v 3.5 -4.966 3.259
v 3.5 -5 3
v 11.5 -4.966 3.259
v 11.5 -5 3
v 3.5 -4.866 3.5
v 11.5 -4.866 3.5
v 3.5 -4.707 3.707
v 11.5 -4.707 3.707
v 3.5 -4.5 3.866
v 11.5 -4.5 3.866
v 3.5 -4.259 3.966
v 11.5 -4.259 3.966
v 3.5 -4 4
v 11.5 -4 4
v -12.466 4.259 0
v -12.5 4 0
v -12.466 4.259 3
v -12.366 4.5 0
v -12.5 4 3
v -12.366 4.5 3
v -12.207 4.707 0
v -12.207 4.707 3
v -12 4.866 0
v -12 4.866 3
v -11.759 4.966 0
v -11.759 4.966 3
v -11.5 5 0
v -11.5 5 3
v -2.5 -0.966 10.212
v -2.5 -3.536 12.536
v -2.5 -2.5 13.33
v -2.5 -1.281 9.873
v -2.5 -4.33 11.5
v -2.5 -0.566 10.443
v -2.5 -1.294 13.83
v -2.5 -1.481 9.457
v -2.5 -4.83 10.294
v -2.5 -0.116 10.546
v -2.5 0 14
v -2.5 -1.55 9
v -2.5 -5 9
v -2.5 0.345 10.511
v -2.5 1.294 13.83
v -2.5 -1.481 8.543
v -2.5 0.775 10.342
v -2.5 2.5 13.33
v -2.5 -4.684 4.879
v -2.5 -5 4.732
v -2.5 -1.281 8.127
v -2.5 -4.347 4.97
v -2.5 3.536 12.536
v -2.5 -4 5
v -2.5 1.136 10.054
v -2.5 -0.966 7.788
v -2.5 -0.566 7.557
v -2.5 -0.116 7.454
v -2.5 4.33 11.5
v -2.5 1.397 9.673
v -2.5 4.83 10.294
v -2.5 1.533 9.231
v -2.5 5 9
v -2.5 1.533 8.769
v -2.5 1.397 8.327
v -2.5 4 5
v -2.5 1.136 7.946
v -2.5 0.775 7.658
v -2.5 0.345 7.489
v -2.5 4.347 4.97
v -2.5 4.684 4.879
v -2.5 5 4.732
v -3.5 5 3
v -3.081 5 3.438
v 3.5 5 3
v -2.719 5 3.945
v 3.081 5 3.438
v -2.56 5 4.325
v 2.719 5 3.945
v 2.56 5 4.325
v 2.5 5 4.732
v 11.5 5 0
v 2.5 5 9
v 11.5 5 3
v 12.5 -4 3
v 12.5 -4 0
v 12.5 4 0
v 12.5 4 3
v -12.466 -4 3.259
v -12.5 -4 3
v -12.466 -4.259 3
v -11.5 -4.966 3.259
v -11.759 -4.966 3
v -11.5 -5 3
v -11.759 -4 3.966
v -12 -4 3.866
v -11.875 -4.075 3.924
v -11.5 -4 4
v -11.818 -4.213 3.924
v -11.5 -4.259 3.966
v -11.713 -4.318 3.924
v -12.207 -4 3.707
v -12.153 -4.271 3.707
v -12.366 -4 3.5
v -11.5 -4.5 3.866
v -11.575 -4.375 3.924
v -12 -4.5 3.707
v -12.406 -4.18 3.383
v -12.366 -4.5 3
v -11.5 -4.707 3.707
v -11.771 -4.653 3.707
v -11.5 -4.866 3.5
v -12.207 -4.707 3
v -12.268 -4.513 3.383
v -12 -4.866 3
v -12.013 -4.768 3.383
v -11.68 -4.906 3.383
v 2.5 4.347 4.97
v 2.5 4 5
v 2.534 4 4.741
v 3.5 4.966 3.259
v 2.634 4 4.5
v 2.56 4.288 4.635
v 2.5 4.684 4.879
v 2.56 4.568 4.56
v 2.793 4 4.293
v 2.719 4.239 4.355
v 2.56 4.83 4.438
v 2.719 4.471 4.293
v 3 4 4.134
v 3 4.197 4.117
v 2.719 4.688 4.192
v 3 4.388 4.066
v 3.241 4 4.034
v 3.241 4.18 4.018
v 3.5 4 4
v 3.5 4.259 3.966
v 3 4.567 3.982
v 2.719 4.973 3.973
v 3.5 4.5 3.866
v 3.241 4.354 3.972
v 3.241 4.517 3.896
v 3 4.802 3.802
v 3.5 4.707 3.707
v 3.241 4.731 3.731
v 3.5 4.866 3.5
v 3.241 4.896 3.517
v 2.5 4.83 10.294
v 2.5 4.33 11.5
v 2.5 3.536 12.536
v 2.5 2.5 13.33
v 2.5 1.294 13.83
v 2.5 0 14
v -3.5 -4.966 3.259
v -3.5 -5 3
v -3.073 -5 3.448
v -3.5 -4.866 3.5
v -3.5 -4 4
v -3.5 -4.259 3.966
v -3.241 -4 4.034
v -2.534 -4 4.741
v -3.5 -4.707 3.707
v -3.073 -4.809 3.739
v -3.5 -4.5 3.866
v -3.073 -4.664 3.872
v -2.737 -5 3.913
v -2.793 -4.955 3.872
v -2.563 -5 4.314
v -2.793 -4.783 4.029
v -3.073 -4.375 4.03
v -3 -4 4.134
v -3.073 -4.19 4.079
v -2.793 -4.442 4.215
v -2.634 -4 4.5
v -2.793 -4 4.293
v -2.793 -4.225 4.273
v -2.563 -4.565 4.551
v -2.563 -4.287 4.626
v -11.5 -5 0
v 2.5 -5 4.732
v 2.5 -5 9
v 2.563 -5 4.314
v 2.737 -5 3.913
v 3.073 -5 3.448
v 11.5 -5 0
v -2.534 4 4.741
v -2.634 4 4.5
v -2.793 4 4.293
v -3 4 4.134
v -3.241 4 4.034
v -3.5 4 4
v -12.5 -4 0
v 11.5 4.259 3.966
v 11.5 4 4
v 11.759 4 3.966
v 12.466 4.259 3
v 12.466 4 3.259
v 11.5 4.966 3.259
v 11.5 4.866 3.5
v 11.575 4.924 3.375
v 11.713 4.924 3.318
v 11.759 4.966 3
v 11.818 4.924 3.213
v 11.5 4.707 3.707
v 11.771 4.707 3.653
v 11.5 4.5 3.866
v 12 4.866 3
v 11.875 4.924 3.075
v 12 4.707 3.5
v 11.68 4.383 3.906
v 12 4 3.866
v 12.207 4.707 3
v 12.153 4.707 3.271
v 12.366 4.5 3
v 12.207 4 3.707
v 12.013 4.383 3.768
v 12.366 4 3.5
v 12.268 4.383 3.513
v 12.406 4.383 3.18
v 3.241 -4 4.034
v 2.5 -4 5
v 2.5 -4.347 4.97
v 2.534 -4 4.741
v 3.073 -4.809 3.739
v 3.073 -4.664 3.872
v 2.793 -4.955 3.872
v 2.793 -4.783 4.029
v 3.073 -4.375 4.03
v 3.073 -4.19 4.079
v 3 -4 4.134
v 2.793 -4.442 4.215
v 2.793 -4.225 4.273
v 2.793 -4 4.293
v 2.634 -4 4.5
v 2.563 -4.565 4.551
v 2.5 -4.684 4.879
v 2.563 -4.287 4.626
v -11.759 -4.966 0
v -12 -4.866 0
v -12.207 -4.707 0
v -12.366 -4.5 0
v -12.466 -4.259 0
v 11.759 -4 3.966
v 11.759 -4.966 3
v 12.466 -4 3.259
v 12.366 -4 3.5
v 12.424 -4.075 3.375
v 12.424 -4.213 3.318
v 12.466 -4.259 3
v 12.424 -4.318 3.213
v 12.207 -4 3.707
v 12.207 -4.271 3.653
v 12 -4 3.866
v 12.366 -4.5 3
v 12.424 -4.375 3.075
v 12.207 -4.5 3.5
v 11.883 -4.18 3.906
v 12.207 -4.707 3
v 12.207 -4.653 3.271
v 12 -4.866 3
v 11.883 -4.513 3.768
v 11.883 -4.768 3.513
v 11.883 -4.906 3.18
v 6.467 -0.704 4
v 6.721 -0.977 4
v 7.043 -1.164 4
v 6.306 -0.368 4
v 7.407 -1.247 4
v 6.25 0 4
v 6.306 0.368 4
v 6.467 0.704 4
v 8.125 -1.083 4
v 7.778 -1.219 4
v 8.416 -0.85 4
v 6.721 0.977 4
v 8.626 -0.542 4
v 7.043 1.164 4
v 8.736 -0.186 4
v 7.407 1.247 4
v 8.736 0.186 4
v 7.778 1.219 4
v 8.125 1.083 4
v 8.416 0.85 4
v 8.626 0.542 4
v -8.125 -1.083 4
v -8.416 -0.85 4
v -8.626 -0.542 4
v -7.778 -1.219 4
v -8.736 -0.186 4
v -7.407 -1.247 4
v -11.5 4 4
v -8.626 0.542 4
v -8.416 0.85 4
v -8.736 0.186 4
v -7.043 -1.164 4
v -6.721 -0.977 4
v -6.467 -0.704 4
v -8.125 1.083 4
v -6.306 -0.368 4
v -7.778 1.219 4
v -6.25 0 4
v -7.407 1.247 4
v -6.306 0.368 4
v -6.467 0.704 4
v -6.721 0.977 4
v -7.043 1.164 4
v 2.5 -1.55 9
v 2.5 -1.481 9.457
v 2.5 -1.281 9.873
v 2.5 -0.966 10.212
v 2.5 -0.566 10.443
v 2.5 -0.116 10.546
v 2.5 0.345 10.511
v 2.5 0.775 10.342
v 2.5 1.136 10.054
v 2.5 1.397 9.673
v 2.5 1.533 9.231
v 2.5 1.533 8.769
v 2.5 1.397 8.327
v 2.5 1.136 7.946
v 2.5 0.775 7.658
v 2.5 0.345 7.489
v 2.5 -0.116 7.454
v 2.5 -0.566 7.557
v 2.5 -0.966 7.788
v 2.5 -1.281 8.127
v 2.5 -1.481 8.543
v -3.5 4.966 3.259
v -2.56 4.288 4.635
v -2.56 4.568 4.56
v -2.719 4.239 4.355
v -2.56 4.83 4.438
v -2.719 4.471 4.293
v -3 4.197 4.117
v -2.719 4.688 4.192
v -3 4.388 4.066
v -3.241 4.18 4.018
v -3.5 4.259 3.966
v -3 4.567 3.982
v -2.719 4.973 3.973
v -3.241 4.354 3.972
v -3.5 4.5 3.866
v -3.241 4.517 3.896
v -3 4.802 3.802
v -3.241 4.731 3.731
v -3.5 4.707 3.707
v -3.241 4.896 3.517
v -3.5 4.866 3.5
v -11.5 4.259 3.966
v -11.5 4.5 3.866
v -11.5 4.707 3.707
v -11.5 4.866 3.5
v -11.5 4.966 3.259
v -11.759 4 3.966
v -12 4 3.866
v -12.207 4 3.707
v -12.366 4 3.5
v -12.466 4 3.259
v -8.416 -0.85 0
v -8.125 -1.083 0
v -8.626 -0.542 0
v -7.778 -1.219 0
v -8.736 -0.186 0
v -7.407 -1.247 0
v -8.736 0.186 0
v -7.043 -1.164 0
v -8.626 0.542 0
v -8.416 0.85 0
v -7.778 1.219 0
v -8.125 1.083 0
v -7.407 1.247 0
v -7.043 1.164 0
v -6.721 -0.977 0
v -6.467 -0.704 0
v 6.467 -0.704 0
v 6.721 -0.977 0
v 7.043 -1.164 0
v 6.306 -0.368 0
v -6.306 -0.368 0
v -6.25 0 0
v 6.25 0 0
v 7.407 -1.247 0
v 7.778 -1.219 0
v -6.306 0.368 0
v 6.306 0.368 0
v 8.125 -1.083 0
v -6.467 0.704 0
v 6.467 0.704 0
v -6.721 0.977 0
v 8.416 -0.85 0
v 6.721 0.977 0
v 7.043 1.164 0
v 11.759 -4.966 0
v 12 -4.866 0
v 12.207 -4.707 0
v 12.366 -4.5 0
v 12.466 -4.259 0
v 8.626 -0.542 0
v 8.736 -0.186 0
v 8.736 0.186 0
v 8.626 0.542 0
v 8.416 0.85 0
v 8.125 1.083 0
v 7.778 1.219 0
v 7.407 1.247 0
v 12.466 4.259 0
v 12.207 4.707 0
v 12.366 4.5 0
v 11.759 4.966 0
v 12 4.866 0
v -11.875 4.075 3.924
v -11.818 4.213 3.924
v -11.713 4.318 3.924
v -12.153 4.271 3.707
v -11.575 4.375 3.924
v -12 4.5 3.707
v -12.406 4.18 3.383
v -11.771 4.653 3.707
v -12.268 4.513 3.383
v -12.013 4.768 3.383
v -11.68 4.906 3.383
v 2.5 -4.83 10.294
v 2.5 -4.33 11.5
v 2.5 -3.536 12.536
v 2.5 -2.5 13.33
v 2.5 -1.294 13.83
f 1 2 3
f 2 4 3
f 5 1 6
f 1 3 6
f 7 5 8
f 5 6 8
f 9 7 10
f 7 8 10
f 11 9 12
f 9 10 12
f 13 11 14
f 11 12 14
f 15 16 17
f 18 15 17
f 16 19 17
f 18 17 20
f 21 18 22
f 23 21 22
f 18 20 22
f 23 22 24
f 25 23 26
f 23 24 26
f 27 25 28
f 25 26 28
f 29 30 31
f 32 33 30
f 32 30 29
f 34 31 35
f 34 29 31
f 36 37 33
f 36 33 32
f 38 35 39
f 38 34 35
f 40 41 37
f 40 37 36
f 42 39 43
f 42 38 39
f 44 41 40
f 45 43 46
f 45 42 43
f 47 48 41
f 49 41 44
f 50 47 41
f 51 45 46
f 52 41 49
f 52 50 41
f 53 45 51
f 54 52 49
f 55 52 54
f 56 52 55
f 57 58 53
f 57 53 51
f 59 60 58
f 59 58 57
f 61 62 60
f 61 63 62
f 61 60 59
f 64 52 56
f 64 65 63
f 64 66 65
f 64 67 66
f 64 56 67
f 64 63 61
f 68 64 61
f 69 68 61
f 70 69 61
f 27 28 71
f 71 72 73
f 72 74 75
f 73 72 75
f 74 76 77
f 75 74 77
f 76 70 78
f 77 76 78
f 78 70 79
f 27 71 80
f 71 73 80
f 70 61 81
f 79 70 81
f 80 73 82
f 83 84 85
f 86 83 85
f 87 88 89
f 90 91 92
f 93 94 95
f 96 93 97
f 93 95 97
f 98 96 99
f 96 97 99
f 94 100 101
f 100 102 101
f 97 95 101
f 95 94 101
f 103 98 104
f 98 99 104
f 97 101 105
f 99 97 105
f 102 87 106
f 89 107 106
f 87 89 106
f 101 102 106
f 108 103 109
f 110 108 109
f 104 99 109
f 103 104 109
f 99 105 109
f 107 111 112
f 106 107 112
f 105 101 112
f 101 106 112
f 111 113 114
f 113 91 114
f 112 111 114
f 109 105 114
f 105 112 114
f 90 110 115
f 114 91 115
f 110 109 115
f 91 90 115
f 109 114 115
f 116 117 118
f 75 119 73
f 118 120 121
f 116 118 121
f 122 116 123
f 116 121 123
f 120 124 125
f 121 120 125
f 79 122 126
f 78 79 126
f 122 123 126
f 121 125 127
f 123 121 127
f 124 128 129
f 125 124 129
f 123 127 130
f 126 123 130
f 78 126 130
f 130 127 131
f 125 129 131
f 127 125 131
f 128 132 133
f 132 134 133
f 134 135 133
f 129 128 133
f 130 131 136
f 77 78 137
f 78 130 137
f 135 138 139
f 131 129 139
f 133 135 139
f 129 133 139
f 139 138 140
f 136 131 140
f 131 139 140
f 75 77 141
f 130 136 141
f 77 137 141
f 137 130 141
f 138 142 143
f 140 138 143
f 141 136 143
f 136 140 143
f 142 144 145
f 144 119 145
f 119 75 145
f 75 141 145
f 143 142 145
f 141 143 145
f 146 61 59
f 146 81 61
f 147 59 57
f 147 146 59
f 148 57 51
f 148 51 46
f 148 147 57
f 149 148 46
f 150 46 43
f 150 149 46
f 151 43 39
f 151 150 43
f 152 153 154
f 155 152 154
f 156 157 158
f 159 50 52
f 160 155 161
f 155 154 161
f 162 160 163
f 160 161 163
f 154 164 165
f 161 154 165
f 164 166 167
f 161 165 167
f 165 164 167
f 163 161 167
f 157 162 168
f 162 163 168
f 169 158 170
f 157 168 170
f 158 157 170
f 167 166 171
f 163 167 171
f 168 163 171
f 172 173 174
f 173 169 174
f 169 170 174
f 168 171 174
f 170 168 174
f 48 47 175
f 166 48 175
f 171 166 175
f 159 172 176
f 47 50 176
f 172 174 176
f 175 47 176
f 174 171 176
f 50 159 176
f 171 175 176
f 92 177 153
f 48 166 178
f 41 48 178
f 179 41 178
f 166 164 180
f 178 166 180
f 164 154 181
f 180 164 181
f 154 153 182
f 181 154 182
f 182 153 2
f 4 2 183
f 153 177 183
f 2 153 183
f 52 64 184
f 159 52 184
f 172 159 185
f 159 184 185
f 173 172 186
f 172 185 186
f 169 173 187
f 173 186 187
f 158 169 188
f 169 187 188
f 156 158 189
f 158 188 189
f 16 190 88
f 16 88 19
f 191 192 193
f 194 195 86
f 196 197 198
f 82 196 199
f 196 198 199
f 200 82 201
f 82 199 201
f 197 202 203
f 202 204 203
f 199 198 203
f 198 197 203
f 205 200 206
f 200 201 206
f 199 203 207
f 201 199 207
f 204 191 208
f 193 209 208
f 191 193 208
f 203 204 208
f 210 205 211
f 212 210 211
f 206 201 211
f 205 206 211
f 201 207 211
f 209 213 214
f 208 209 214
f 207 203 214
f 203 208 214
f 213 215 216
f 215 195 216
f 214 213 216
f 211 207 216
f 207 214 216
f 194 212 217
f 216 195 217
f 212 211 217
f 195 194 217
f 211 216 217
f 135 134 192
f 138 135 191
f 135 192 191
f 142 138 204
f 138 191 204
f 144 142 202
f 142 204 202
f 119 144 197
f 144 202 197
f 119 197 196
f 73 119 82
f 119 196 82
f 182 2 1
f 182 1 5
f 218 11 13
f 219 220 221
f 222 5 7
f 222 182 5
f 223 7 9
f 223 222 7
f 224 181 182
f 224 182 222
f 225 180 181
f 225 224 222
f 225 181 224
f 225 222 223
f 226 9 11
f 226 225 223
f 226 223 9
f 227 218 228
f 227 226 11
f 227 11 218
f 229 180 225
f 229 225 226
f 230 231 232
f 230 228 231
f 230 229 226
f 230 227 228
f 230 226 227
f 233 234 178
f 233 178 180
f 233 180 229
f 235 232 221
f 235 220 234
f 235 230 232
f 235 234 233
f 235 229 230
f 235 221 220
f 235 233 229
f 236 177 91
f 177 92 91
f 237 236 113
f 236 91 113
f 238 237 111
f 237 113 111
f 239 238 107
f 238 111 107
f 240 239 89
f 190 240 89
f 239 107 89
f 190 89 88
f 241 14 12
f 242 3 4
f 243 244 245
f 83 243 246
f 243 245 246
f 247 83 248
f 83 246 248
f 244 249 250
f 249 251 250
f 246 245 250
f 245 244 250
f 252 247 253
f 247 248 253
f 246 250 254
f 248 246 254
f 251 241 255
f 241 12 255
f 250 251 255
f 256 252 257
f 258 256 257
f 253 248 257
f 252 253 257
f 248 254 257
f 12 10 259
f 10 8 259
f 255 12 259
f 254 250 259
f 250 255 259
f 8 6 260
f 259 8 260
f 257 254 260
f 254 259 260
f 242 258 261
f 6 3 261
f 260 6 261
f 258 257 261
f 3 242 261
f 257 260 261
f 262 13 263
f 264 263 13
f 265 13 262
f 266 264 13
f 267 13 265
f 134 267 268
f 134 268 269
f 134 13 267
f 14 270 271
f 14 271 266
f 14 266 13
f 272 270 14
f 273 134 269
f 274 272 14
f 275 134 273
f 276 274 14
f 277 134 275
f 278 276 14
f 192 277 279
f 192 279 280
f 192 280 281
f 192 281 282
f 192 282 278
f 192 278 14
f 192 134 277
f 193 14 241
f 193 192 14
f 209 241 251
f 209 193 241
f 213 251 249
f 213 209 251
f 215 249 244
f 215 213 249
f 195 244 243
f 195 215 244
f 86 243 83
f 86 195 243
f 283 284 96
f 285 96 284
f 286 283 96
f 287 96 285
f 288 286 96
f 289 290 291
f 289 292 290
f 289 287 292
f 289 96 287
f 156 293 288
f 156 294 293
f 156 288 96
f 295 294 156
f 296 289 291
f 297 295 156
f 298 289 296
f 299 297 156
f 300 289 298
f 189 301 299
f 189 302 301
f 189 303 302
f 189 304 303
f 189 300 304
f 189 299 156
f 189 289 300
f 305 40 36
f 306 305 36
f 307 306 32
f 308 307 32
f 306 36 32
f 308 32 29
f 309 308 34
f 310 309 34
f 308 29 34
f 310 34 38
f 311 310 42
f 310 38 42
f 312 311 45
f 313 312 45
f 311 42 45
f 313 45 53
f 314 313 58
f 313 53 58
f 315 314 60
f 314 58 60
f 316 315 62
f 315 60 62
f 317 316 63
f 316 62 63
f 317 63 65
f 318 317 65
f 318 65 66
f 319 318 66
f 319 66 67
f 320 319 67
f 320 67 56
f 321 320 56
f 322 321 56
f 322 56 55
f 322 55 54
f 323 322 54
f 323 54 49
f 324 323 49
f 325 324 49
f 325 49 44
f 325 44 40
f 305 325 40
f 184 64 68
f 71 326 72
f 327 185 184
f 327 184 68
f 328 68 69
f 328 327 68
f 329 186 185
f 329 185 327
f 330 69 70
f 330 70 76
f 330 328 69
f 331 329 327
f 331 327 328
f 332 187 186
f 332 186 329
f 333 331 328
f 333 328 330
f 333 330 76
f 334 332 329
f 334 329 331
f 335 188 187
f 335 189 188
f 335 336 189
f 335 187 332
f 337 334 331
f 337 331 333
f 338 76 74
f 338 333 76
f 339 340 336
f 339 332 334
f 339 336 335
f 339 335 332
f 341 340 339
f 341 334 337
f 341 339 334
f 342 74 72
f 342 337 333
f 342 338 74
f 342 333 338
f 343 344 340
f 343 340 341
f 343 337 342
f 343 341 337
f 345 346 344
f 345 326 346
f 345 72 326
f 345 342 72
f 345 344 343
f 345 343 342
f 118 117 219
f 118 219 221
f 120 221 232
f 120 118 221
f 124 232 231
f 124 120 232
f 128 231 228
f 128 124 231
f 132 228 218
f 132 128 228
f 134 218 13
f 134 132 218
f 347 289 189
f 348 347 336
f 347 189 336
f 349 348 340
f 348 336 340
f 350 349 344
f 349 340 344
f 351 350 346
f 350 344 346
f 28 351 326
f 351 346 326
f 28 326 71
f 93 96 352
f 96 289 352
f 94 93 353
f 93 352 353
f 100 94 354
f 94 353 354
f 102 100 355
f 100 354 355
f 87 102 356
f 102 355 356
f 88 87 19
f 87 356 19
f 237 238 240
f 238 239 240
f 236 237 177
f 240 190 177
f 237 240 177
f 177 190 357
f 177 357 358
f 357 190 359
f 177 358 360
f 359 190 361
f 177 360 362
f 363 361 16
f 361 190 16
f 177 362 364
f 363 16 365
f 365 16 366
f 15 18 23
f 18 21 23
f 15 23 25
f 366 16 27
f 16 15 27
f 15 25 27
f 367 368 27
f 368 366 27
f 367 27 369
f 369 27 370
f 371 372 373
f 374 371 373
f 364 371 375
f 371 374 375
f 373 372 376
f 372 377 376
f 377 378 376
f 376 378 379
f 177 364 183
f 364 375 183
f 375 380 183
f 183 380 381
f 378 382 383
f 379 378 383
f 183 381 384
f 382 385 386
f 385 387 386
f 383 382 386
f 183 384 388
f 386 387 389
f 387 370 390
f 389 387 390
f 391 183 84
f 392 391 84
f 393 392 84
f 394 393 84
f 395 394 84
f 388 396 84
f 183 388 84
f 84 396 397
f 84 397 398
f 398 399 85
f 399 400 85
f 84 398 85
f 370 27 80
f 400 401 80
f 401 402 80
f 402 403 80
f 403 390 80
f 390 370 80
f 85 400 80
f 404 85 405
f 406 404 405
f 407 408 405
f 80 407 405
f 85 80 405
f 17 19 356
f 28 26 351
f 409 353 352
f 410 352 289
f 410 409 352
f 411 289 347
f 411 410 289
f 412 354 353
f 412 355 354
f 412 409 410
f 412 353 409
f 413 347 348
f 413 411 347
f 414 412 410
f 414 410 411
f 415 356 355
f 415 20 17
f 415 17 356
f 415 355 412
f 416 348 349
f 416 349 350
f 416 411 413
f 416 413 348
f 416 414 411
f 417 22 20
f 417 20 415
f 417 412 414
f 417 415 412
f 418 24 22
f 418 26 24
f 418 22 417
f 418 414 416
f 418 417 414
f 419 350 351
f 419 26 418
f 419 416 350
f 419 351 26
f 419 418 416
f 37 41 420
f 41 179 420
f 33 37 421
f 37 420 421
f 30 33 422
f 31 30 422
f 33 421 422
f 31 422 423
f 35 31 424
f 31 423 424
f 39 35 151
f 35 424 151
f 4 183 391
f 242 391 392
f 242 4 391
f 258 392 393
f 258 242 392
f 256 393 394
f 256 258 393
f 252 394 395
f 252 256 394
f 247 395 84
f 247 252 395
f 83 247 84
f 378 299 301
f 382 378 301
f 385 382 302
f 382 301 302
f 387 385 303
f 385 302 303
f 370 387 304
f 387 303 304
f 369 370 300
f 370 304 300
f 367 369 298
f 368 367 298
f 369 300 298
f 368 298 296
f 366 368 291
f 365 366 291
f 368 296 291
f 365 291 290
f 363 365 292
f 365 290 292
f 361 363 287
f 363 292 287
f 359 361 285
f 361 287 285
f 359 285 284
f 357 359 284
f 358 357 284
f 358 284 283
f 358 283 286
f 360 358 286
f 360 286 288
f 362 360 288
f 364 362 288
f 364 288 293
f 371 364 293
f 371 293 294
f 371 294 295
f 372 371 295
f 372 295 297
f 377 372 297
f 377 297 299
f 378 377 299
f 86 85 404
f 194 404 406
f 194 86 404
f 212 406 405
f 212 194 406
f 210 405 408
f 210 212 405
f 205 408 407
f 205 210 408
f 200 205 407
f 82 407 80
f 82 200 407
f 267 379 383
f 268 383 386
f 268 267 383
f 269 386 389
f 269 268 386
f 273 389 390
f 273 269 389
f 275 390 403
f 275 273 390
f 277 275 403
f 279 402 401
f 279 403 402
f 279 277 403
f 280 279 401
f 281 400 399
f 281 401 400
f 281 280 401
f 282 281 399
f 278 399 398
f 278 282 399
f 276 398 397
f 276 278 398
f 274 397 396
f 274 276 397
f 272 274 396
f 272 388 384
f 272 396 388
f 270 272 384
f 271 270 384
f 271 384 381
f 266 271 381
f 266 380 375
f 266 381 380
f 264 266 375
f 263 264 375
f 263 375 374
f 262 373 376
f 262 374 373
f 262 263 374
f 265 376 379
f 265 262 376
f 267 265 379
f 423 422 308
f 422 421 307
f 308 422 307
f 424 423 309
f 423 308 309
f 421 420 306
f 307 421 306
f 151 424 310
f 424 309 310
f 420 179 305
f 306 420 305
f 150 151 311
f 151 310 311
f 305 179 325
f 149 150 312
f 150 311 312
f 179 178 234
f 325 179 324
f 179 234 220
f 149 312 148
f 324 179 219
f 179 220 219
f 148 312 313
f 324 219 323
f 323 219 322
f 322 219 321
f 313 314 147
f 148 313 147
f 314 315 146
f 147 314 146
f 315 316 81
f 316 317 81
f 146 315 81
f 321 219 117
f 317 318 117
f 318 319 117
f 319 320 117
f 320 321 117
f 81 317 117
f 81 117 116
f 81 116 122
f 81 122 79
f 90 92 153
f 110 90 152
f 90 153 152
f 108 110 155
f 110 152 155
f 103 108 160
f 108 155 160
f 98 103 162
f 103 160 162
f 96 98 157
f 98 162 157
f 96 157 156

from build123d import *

# Parameters (mm, degrees)
F0_W          = 25
F0_H          = 10
F1_DEPTH      = 4
F2_W          = 5
F2_H          = 10
F3_DEPTH      = 10
F4_R          = 1.25
F5_DEPTH      = 4.001
F7_R          = 4.99999
F8_R          = 1.55
F9_DEPTH      = 15.001
F10_R         = 1
F11_T1_DEPTH  = 8
F11_T6_ANGLE  = 233.2969892374
F11_T11_ANGLE = 233.2969892374
F11_T16_ANGLE = 233.2969892374
F11_T21_ANGLE = 233.2969892374


# Not quite as in the source:
# - a fillet or chamfer that OpenCascade refuses, or shapes differently, is made with other operations: its cross-section is extruded or revolved along the edge and cut away or added
# - a fillet or chamfer is up to 0.001 mm smaller than in the source, because OpenCascade refuses the exact size
# - a pattern or mirror of a feature is missing from the dataset's text; its kind, count and spacing are read off the source's solid


with BuildPart() as f1:
    # F0 (on Top) → F1 (new body)
    with BuildSketch(Plane.XY):
        Rectangle(F0_W, F0_H)
    extrude(amount=F1_DEPTH)

    # F2 (on face) → F3 (join)
    with BuildSketch(Plane.XY.offset(4)):
        Rectangle(F2_W, F2_H)
    extrude(amount=F3_DEPTH)

    # F4 (on face) → F5 (cut, through all)
    with BuildSketch(Plane.XY.offset(4)):
        with Locations((-7.5, 0)):
            Circle(F4_R)
    f5 = extrude(amount=-F5_DEPTH, mode=Mode.SUBTRACT)

    # F5_copies: F5 across plane
    add(f5.mirror(Plane(origin=(0, 0, 0), x_dir=(0, 0, 1), z_dir=(1, 0, 0))), mode=Mode.SUBTRACT)

    # F7 (radius 5 in the source; OpenCascade refuses exactly that, so slightly less here)
    f7_edges = [f1.edges().sort_by_distance(p)[0] for p in [
        (0, -5, 14),
        (0, 5, 14),
    ]]
    fillet(f7_edges, radius=F7_R)

    # F8 (on face) → F9 (cut, through all)
    with BuildSketch(Plane(origin=(-2.5, 0, 0), x_dir=(0, -1, 0), z_dir=(-1, 0, 0))):
        with Locations((0, 9)):
            Circle(F8_R)
    extrude(amount=-F9_DEPTH, mode=Mode.SUBTRACT)

    # F10
    f10_edges = [f1.edges().sort_by_distance(p)[0] for p in [
        (7.5, -5, 4),
        (12.5, 0, 4),
        (7.5, 5, 4),
        (12.5, -5, 2),
        (12.5, 5, 2),
        (-12.5, -5, 2),
        (-12.5, 5, 2),
        (-12.5, 0, 4),
        (-7.5, -5, 4),
        (-7.5, 5, 4),
    ]]
    fillet(f10_edges, radius=F10_R)

    # F11: fillet of radius 1 on 2 edges, made by hand

    # F11_s2 → F11_t1 (join)
    with BuildSketch(Plane.XZ.offset(-4)):
        with BuildLine():
            ThreePointArc((2.5, 5), (2.7928932188, 4.2928932188), (3.5, 4))
            Line((3.5, 4), (2.5, 4))
            Line((2.5, 4), (2.5, 5))
        make_face()
        with BuildLine():
            ThreePointArc((-2.5, 5), (-2.7928932188, 4.2928932188), (-3.5, 4))
            Line((-3.5, 4), (-2.5, 4))
            Line((-2.5, 4), (-2.5, 5))
        make_face()
    extrude(amount=F11_T1_DEPTH)


with BuildPart() as f11_tool4:
    # F11_s5 → F11_t6 (revolve)
    with BuildSketch(Plane.XZ.offset(-4)):
        with BuildLine():
            ThreePointArc((-2.5, 5), (-2.7928932188, 4.2928932188), (-3.5, 4))
            Line((-3.5, 4), (-2.5, 4))
            Line((-2.5, 4), (-2.5, 5))
        make_face()
    revolve(axis=Axis((-2.5, 4, 3), (-1, 0, 0)), revolution_arc=F11_T6_ANGLE)

    split(bisect_by=Plane.XZ.offset(-5), keep=Keep.TOP)


with BuildPart() as f1_1:
    add(f1.part)

    # F11_t3: union F11_tool4
    add(f11_tool4.part)


with BuildPart() as f11_tool9:
    # F11_s10 → F11_t11 (revolve)
    with BuildSketch(Plane(origin=(0, 0.0087041916, 0.0116762883), x_dir=(1, 0, 0), z_dir=(0, 0.5976672776, 0.8017442393))):
        with BuildLine():
            ThreePointArc((-3.5, -3.9999787901), (-2.7928932188, -3.7070855713), (-2.5, -2.9999787901))
            Line((-2.5, -2.9999787901), (-2.5, -3.9999787901))
            Line((-2.5, -3.9999787901), (-3.5, -3.9999787901))
        make_face()
    revolve(axis=Axis((-2.5, -4, 3), (-1, 0, 0)), revolution_arc=F11_T11_ANGLE)

    split(bisect_by=Plane.XZ.offset(5), keep=Keep.BOTTOM)


with BuildPart() as f1_2:
    add(f1_1.part)

    # F11_t8: union F11_tool9
    add(f11_tool9.part)


with BuildPart() as f11_tool14:
    # F11_s15 → F11_t16 (revolve)
    with BuildSketch(Plane(origin=(0, 0.0087041916, 0.0116762883), x_dir=(1, 0, 0), z_dir=(0, 0.5976672776, 0.8017442393))):
        with BuildLine():
            ThreePointArc((3.5, -3.9999787901), (2.7928932188, -3.7070855713), (2.5, -2.9999787901))
            Line((2.5, -2.9999787901), (2.5, -3.9999787901))
            Line((2.5, -3.9999787901), (3.5, -3.9999787901))
        make_face()
    revolve(axis=Axis((2.5, -4, 3), (-1, 0, 0)), revolution_arc=F11_T16_ANGLE)

    split(bisect_by=Plane.XZ.offset(5), keep=Keep.BOTTOM)


with BuildPart() as f1_3:
    add(f1_2.part)

    # F11_t13: union F11_tool14
    add(f11_tool14.part)


with BuildPart() as f11_tool19:
    # F11_s20 → F11_t21 (revolve)
    with BuildSketch(Plane.XZ.offset(-4)):
        with BuildLine():
            ThreePointArc((2.5, 5), (2.7928932188, 4.2928932188), (3.5, 4))
            Line((3.5, 4), (2.5, 4))
            Line((2.5, 4), (2.5, 5))
        make_face()
    revolve(axis=Axis((2.5, 4, 3), (-1, 0, 0)), revolution_arc=F11_T21_ANGLE)

    split(bisect_by=Plane.XZ.offset(-5), keep=Keep.TOP)


with BuildPart() as f1_4:
    add(f1_3.part)

    # F11_t18: union F11_tool19
    add(f11_tool19.part)


solid = f1_4.part
